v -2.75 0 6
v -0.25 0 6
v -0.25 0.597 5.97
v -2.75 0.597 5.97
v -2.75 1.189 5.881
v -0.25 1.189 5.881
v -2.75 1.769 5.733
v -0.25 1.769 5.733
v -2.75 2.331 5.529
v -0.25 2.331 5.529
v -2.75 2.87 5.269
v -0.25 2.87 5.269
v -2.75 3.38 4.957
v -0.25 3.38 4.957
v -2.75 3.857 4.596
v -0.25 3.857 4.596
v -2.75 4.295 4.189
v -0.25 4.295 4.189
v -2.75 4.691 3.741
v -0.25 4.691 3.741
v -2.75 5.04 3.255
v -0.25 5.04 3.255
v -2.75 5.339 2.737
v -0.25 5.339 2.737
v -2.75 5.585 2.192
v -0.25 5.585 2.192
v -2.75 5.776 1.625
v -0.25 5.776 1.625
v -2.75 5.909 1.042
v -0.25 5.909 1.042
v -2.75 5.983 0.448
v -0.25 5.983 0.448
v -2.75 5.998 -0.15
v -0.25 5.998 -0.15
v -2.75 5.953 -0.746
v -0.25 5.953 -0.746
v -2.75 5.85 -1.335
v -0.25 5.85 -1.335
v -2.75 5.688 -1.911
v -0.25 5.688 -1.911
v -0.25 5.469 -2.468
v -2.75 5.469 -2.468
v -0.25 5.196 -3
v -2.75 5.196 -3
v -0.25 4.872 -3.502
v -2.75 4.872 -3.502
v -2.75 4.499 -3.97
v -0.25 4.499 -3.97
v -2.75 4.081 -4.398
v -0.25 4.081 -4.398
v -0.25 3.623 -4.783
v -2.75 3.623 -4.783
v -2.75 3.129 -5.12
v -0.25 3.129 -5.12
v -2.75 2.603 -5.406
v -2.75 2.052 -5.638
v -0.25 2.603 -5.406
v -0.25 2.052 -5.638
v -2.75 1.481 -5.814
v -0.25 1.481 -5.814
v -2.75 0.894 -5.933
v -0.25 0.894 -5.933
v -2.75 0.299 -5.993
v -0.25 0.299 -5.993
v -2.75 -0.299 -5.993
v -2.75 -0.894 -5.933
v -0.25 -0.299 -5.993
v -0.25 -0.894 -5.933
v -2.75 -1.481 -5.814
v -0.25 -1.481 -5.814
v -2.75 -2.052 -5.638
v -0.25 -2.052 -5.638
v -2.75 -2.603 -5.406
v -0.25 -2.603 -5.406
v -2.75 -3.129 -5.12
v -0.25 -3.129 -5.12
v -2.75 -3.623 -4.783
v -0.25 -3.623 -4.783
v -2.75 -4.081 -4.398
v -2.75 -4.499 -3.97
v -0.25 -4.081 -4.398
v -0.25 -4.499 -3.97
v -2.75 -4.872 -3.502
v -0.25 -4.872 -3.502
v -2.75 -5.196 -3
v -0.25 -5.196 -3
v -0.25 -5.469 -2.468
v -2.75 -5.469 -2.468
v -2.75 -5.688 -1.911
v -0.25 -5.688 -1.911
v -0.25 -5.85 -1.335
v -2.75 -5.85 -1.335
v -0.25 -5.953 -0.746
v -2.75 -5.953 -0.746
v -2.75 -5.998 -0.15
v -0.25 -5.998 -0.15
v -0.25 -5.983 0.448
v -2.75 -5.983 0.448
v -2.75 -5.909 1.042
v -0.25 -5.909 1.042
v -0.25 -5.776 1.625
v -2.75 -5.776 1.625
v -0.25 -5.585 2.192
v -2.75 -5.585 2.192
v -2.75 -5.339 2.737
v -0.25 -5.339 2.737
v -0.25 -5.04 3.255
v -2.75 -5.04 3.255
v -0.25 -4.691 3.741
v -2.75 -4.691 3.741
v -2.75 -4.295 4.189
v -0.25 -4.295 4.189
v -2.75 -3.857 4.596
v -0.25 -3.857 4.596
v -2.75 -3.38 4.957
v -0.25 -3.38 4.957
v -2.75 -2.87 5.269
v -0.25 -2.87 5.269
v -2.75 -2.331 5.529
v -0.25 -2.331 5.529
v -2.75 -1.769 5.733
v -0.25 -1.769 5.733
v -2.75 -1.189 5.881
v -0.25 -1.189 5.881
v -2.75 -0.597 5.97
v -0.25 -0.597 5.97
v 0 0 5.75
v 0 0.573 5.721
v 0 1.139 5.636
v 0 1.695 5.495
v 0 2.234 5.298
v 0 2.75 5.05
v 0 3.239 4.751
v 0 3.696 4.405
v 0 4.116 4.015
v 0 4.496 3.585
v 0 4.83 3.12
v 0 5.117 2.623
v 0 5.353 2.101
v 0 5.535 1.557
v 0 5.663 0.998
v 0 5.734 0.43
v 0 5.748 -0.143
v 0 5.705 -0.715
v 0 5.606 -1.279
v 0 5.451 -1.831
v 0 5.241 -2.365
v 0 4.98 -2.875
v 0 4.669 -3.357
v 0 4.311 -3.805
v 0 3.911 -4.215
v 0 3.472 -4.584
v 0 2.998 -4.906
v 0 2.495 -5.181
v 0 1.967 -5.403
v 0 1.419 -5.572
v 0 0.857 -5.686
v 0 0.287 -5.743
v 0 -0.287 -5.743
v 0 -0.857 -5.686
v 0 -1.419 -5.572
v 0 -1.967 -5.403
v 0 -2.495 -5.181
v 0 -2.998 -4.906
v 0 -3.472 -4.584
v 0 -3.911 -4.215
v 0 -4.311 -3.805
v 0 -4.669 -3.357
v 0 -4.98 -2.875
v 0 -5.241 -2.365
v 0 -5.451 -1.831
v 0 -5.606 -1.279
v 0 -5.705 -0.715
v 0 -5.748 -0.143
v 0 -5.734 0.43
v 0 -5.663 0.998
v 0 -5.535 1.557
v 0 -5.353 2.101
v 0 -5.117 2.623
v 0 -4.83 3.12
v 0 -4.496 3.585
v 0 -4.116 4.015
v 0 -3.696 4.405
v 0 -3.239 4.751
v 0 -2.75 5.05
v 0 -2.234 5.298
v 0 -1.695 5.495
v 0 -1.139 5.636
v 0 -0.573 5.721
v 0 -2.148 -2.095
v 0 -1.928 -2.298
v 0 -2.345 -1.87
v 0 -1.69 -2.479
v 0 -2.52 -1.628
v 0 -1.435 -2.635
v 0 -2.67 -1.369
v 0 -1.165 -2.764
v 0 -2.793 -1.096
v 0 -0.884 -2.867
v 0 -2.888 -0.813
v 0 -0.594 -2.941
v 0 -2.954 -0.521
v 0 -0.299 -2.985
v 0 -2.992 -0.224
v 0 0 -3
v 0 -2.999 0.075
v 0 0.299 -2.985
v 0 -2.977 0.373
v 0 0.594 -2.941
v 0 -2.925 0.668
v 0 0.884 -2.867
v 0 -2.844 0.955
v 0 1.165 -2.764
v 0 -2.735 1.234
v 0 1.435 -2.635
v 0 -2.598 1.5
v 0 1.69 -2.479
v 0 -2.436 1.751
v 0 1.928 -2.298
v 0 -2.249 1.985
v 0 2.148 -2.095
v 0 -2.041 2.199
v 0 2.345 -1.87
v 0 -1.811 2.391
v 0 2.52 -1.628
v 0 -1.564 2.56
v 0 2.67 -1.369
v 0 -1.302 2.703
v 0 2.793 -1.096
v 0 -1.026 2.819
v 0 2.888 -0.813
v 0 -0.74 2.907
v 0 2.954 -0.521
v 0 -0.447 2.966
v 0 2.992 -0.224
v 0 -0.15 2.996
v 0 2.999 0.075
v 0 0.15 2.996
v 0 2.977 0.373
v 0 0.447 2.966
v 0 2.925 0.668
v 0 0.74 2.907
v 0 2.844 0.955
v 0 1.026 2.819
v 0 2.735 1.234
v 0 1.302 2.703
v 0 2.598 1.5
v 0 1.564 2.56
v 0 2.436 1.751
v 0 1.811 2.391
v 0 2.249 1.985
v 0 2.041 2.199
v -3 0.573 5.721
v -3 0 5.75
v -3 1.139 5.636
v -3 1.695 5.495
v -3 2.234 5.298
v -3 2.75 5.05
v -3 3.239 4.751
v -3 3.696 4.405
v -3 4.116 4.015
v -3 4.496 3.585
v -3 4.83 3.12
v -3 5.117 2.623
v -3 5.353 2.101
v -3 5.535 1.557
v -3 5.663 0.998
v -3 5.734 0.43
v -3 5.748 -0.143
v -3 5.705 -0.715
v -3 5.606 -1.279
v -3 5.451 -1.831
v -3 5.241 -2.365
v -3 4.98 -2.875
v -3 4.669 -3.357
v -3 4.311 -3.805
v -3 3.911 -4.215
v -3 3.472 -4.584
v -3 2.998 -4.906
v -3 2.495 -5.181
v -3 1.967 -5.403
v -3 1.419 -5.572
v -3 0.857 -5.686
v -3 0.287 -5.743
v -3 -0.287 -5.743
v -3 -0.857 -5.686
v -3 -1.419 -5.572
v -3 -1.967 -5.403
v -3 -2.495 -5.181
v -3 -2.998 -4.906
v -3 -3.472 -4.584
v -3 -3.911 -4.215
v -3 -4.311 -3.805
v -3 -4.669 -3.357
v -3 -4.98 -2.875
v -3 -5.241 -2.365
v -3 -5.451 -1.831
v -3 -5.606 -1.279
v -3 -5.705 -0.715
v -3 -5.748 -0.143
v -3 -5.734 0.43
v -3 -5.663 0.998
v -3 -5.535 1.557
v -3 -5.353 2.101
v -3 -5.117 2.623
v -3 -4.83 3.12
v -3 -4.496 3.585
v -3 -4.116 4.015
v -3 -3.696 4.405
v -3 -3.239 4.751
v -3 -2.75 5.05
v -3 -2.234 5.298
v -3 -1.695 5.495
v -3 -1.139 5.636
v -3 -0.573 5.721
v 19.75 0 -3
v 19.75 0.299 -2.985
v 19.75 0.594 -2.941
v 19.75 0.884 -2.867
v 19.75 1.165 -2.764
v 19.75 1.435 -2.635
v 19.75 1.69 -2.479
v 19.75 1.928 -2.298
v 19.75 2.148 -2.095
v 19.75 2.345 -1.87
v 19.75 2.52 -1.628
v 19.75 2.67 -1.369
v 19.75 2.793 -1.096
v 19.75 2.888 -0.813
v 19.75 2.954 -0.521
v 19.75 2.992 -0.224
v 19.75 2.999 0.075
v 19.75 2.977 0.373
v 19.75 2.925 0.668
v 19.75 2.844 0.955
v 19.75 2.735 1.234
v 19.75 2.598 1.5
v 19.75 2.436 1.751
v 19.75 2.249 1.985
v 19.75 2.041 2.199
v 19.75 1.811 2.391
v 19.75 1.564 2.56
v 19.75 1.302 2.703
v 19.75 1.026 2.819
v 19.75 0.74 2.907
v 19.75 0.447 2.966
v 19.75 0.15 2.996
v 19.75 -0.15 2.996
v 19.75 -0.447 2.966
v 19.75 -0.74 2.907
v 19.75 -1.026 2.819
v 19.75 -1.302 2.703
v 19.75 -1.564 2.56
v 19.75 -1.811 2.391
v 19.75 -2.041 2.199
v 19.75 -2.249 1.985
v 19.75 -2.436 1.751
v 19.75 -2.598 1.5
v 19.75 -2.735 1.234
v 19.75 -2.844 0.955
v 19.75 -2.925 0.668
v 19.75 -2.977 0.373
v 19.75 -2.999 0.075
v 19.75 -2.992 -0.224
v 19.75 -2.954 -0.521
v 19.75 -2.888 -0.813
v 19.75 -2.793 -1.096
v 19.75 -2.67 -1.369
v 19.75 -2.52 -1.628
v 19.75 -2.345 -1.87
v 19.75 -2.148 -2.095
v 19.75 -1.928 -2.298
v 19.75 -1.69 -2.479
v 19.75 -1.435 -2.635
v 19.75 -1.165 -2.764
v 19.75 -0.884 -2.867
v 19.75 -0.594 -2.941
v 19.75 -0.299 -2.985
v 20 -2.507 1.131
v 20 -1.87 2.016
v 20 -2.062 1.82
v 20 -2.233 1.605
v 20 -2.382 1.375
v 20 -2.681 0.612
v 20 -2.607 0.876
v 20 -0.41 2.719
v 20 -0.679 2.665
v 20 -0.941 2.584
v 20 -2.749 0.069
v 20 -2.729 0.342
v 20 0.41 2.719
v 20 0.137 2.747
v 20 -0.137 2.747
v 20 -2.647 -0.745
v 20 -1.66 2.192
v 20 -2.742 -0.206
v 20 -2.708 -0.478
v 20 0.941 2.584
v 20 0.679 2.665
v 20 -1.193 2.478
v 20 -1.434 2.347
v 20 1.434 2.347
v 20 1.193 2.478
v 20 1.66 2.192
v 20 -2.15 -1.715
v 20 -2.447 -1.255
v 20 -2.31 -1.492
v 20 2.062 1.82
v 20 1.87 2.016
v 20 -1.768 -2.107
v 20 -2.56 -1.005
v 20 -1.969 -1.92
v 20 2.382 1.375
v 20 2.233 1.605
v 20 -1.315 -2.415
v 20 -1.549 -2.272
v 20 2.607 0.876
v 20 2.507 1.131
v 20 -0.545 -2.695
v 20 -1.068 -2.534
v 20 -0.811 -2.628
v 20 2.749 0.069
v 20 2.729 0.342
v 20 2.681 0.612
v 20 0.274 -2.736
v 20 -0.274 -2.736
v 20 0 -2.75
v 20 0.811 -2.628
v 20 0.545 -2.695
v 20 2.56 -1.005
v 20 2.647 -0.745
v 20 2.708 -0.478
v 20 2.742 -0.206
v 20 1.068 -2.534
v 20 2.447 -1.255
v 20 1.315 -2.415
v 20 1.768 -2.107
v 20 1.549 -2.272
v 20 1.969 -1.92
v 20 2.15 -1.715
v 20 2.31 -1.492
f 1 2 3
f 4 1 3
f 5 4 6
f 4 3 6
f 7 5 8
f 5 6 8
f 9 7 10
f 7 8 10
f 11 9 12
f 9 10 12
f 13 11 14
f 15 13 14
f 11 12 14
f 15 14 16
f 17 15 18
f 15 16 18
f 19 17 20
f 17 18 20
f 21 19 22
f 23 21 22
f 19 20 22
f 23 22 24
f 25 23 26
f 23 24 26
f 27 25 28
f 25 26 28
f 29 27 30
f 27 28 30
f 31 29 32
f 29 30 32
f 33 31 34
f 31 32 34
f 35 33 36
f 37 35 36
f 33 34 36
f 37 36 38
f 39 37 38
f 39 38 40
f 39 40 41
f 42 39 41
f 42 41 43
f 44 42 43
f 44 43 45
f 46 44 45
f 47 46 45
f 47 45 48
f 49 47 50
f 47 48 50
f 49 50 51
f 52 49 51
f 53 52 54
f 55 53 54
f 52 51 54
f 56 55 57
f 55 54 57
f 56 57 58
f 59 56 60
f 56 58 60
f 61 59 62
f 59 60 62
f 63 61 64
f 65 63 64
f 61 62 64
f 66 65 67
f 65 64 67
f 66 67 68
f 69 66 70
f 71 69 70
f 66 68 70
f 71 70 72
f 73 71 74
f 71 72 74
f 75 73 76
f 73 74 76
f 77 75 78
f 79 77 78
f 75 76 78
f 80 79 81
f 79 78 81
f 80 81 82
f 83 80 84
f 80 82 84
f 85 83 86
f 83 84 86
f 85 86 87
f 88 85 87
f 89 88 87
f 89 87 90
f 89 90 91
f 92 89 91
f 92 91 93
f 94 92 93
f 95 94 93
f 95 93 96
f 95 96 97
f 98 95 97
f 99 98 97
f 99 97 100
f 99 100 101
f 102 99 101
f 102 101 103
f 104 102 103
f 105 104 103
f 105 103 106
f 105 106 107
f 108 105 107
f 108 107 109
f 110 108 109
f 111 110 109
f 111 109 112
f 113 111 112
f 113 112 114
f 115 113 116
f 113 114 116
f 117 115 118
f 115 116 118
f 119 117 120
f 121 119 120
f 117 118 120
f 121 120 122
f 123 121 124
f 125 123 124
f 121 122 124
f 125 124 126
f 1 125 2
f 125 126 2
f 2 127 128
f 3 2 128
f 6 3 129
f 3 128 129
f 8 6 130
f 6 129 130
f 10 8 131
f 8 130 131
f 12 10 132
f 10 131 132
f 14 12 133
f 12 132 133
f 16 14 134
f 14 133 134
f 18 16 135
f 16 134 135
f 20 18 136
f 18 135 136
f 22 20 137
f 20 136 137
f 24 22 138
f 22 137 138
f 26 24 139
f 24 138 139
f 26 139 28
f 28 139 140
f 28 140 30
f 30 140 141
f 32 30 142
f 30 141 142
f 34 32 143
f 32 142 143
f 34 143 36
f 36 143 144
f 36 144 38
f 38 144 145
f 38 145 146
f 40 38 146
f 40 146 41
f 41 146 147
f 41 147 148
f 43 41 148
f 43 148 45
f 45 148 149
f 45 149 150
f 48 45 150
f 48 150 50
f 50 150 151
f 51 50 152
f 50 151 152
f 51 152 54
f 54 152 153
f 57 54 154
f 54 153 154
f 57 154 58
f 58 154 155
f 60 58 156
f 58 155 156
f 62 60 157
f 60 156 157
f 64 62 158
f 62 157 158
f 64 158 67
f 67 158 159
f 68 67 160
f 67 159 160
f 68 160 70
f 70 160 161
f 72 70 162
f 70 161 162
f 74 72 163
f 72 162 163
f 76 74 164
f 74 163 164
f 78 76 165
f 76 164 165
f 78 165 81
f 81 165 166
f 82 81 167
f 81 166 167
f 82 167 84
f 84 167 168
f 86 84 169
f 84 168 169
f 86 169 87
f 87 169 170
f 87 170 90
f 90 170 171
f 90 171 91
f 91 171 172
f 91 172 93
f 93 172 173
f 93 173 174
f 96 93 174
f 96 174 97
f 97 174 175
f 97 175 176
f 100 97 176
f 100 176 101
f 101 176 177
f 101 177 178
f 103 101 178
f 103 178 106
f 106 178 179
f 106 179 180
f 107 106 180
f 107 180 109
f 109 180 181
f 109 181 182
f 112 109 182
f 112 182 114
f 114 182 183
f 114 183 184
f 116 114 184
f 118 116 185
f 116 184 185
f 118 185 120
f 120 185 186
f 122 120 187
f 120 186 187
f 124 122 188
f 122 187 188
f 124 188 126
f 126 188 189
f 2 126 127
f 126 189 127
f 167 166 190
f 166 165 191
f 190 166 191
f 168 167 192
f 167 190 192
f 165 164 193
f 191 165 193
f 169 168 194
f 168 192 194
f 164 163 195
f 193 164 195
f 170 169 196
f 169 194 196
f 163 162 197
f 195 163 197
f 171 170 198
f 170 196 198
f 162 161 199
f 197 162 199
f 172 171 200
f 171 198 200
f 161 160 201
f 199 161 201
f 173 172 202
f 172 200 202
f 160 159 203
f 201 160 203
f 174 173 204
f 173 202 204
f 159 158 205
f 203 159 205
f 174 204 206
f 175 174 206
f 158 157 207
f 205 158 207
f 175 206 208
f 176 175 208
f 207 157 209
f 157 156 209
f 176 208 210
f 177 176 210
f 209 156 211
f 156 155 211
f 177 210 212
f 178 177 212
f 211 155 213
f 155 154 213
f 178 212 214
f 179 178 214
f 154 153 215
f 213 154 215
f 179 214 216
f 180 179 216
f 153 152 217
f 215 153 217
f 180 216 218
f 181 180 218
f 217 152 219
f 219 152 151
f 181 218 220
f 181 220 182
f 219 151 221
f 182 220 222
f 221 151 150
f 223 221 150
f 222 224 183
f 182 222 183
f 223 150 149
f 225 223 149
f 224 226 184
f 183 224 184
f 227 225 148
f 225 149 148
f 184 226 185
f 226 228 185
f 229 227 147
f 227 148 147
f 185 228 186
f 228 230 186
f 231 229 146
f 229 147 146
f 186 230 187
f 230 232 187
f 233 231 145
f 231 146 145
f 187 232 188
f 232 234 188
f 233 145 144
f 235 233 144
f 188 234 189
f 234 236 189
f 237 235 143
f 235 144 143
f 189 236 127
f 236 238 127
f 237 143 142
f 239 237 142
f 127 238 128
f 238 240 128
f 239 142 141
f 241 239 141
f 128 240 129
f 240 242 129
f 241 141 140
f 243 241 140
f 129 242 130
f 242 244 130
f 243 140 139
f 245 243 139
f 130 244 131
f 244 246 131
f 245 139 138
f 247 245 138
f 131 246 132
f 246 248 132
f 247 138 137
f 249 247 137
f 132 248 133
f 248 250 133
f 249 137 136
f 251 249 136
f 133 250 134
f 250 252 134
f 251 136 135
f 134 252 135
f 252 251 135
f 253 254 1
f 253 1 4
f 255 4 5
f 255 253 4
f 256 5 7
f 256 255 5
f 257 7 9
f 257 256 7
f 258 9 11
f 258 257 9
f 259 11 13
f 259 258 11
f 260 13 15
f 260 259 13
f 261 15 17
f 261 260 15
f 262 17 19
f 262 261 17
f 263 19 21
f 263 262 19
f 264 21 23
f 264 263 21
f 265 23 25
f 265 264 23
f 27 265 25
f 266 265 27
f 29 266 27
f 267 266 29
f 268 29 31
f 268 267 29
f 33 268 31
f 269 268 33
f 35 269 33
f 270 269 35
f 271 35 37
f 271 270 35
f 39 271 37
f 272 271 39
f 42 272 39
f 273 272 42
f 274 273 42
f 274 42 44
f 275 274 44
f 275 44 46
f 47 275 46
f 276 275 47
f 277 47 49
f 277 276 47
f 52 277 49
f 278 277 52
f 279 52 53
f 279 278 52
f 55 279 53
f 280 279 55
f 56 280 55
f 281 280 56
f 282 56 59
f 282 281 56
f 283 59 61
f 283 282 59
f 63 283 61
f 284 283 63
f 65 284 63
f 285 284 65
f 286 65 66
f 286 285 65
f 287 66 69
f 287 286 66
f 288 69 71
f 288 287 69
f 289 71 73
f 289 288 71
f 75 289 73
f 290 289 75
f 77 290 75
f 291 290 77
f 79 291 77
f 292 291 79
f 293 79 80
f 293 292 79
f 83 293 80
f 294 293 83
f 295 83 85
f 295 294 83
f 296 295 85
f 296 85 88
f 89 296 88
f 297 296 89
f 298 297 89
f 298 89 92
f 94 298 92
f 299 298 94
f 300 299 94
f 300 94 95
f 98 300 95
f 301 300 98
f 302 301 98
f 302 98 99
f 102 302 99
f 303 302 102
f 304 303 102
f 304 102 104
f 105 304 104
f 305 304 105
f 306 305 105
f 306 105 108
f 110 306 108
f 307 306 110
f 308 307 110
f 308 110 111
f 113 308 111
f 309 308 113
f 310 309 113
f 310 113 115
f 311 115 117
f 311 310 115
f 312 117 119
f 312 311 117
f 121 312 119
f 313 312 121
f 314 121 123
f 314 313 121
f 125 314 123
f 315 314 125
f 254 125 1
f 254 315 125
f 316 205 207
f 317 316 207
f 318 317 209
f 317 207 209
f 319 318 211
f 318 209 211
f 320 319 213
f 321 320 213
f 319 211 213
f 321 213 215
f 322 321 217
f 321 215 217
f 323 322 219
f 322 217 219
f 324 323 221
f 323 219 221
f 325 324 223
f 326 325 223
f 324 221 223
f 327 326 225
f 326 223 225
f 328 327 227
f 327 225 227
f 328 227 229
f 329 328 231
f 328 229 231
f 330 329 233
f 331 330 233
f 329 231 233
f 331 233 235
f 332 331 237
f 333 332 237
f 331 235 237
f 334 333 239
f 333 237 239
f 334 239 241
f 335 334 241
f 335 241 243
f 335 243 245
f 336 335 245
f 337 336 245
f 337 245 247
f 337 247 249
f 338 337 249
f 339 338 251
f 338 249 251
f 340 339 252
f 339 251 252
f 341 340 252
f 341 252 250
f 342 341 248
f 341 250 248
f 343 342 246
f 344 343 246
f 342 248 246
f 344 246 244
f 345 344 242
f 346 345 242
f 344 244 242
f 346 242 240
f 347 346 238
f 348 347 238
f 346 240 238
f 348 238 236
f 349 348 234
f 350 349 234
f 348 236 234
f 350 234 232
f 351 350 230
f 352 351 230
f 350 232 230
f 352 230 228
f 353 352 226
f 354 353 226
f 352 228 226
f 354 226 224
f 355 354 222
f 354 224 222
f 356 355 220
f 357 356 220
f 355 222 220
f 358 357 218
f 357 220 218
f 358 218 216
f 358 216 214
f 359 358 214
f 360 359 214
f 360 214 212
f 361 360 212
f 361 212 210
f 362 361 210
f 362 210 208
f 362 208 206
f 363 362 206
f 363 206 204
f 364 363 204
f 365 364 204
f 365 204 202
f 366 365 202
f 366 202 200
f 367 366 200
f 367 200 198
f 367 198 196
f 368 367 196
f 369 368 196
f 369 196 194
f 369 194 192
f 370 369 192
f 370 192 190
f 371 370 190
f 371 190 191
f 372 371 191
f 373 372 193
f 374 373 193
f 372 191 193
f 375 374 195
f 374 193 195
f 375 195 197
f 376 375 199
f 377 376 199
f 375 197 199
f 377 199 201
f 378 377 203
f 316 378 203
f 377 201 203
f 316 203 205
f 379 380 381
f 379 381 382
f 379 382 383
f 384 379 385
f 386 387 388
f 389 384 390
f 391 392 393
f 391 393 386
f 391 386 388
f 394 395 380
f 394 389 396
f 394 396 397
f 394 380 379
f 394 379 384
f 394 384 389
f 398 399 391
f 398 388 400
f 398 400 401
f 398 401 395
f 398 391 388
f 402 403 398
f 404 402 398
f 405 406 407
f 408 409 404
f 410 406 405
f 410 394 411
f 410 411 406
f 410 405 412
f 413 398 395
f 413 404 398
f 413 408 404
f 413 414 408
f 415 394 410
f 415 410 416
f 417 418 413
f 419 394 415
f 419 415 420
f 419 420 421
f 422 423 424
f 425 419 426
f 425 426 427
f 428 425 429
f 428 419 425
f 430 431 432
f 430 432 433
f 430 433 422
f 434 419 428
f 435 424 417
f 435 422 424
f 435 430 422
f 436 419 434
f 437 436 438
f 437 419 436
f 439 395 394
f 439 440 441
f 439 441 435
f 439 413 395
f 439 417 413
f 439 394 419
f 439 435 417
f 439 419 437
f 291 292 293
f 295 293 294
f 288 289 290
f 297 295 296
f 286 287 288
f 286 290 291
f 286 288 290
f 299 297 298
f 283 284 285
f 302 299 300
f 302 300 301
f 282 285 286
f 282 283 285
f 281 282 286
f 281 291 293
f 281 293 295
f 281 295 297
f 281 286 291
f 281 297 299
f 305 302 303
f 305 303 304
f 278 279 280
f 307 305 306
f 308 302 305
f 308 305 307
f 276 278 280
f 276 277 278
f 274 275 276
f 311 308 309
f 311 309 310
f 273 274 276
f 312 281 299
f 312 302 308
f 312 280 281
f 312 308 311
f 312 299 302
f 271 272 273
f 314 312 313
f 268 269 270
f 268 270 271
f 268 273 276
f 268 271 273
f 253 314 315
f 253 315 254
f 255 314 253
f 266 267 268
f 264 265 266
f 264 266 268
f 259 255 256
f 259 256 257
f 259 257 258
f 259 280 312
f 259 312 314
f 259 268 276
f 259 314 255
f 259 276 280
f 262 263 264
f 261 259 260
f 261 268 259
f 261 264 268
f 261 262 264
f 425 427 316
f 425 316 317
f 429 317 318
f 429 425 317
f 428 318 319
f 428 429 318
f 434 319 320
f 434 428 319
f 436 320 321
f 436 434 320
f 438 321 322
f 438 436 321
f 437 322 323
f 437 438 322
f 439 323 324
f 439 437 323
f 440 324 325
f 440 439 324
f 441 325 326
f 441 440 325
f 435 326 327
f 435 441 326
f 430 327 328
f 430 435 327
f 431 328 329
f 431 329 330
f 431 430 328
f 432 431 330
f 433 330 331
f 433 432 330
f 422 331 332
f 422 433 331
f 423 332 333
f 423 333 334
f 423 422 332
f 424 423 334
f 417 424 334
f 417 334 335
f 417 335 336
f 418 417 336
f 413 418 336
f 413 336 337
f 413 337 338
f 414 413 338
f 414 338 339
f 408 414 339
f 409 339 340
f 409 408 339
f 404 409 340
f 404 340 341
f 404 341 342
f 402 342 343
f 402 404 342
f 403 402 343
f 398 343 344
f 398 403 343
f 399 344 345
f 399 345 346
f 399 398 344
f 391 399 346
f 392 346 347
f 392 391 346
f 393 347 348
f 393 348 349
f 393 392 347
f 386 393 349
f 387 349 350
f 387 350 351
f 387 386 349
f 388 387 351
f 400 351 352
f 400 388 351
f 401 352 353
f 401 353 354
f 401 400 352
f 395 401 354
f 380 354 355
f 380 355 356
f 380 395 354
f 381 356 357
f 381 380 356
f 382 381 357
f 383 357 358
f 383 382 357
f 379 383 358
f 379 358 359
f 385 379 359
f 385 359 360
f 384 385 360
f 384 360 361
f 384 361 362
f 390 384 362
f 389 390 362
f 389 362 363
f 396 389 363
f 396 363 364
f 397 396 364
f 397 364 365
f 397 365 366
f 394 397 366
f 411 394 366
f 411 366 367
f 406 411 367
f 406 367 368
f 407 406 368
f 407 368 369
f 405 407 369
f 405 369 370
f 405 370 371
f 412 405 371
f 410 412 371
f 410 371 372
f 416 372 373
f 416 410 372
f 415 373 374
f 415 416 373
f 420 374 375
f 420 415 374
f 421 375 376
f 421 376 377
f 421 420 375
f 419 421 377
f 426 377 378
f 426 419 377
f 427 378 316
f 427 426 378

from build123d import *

# Parameters (mm, degrees)
SKETCH1_R           = 3
SHAFT_DEPTH         = 20
SKETCH2_R           = 6
BOSS_EXTRUDE2_DEPTH = 3
CHAMFER1_SIZE       = 0.25


with BuildPart() as part:
    # Sketch1 → SHAFT (new body)
    with BuildSketch(Plane(origin=(0, 0, 0), x_dir=(0, 0, -1), z_dir=(1, 0, 0))):
        Circle(SKETCH1_R)
    extrude(amount=SHAFT_DEPTH)

    # Sketch2 → Boss-Extrude2 (add)
    with BuildSketch(Plane.ZY):
        Circle(SKETCH2_R)
    extrude(amount=BOSS_EXTRUDE2_DEPTH)

    # Chamfer1
    chamfer1_edges = [part.edges().sort_by_distance(p)[0] for p in [
        (20, 0, 3),
        (0, 0, -6),
        (-3, 0, -6),
    ]]
    chamfer(chamfer1_edges, length=CHAMFER1_SIZE)


solid = part.part
